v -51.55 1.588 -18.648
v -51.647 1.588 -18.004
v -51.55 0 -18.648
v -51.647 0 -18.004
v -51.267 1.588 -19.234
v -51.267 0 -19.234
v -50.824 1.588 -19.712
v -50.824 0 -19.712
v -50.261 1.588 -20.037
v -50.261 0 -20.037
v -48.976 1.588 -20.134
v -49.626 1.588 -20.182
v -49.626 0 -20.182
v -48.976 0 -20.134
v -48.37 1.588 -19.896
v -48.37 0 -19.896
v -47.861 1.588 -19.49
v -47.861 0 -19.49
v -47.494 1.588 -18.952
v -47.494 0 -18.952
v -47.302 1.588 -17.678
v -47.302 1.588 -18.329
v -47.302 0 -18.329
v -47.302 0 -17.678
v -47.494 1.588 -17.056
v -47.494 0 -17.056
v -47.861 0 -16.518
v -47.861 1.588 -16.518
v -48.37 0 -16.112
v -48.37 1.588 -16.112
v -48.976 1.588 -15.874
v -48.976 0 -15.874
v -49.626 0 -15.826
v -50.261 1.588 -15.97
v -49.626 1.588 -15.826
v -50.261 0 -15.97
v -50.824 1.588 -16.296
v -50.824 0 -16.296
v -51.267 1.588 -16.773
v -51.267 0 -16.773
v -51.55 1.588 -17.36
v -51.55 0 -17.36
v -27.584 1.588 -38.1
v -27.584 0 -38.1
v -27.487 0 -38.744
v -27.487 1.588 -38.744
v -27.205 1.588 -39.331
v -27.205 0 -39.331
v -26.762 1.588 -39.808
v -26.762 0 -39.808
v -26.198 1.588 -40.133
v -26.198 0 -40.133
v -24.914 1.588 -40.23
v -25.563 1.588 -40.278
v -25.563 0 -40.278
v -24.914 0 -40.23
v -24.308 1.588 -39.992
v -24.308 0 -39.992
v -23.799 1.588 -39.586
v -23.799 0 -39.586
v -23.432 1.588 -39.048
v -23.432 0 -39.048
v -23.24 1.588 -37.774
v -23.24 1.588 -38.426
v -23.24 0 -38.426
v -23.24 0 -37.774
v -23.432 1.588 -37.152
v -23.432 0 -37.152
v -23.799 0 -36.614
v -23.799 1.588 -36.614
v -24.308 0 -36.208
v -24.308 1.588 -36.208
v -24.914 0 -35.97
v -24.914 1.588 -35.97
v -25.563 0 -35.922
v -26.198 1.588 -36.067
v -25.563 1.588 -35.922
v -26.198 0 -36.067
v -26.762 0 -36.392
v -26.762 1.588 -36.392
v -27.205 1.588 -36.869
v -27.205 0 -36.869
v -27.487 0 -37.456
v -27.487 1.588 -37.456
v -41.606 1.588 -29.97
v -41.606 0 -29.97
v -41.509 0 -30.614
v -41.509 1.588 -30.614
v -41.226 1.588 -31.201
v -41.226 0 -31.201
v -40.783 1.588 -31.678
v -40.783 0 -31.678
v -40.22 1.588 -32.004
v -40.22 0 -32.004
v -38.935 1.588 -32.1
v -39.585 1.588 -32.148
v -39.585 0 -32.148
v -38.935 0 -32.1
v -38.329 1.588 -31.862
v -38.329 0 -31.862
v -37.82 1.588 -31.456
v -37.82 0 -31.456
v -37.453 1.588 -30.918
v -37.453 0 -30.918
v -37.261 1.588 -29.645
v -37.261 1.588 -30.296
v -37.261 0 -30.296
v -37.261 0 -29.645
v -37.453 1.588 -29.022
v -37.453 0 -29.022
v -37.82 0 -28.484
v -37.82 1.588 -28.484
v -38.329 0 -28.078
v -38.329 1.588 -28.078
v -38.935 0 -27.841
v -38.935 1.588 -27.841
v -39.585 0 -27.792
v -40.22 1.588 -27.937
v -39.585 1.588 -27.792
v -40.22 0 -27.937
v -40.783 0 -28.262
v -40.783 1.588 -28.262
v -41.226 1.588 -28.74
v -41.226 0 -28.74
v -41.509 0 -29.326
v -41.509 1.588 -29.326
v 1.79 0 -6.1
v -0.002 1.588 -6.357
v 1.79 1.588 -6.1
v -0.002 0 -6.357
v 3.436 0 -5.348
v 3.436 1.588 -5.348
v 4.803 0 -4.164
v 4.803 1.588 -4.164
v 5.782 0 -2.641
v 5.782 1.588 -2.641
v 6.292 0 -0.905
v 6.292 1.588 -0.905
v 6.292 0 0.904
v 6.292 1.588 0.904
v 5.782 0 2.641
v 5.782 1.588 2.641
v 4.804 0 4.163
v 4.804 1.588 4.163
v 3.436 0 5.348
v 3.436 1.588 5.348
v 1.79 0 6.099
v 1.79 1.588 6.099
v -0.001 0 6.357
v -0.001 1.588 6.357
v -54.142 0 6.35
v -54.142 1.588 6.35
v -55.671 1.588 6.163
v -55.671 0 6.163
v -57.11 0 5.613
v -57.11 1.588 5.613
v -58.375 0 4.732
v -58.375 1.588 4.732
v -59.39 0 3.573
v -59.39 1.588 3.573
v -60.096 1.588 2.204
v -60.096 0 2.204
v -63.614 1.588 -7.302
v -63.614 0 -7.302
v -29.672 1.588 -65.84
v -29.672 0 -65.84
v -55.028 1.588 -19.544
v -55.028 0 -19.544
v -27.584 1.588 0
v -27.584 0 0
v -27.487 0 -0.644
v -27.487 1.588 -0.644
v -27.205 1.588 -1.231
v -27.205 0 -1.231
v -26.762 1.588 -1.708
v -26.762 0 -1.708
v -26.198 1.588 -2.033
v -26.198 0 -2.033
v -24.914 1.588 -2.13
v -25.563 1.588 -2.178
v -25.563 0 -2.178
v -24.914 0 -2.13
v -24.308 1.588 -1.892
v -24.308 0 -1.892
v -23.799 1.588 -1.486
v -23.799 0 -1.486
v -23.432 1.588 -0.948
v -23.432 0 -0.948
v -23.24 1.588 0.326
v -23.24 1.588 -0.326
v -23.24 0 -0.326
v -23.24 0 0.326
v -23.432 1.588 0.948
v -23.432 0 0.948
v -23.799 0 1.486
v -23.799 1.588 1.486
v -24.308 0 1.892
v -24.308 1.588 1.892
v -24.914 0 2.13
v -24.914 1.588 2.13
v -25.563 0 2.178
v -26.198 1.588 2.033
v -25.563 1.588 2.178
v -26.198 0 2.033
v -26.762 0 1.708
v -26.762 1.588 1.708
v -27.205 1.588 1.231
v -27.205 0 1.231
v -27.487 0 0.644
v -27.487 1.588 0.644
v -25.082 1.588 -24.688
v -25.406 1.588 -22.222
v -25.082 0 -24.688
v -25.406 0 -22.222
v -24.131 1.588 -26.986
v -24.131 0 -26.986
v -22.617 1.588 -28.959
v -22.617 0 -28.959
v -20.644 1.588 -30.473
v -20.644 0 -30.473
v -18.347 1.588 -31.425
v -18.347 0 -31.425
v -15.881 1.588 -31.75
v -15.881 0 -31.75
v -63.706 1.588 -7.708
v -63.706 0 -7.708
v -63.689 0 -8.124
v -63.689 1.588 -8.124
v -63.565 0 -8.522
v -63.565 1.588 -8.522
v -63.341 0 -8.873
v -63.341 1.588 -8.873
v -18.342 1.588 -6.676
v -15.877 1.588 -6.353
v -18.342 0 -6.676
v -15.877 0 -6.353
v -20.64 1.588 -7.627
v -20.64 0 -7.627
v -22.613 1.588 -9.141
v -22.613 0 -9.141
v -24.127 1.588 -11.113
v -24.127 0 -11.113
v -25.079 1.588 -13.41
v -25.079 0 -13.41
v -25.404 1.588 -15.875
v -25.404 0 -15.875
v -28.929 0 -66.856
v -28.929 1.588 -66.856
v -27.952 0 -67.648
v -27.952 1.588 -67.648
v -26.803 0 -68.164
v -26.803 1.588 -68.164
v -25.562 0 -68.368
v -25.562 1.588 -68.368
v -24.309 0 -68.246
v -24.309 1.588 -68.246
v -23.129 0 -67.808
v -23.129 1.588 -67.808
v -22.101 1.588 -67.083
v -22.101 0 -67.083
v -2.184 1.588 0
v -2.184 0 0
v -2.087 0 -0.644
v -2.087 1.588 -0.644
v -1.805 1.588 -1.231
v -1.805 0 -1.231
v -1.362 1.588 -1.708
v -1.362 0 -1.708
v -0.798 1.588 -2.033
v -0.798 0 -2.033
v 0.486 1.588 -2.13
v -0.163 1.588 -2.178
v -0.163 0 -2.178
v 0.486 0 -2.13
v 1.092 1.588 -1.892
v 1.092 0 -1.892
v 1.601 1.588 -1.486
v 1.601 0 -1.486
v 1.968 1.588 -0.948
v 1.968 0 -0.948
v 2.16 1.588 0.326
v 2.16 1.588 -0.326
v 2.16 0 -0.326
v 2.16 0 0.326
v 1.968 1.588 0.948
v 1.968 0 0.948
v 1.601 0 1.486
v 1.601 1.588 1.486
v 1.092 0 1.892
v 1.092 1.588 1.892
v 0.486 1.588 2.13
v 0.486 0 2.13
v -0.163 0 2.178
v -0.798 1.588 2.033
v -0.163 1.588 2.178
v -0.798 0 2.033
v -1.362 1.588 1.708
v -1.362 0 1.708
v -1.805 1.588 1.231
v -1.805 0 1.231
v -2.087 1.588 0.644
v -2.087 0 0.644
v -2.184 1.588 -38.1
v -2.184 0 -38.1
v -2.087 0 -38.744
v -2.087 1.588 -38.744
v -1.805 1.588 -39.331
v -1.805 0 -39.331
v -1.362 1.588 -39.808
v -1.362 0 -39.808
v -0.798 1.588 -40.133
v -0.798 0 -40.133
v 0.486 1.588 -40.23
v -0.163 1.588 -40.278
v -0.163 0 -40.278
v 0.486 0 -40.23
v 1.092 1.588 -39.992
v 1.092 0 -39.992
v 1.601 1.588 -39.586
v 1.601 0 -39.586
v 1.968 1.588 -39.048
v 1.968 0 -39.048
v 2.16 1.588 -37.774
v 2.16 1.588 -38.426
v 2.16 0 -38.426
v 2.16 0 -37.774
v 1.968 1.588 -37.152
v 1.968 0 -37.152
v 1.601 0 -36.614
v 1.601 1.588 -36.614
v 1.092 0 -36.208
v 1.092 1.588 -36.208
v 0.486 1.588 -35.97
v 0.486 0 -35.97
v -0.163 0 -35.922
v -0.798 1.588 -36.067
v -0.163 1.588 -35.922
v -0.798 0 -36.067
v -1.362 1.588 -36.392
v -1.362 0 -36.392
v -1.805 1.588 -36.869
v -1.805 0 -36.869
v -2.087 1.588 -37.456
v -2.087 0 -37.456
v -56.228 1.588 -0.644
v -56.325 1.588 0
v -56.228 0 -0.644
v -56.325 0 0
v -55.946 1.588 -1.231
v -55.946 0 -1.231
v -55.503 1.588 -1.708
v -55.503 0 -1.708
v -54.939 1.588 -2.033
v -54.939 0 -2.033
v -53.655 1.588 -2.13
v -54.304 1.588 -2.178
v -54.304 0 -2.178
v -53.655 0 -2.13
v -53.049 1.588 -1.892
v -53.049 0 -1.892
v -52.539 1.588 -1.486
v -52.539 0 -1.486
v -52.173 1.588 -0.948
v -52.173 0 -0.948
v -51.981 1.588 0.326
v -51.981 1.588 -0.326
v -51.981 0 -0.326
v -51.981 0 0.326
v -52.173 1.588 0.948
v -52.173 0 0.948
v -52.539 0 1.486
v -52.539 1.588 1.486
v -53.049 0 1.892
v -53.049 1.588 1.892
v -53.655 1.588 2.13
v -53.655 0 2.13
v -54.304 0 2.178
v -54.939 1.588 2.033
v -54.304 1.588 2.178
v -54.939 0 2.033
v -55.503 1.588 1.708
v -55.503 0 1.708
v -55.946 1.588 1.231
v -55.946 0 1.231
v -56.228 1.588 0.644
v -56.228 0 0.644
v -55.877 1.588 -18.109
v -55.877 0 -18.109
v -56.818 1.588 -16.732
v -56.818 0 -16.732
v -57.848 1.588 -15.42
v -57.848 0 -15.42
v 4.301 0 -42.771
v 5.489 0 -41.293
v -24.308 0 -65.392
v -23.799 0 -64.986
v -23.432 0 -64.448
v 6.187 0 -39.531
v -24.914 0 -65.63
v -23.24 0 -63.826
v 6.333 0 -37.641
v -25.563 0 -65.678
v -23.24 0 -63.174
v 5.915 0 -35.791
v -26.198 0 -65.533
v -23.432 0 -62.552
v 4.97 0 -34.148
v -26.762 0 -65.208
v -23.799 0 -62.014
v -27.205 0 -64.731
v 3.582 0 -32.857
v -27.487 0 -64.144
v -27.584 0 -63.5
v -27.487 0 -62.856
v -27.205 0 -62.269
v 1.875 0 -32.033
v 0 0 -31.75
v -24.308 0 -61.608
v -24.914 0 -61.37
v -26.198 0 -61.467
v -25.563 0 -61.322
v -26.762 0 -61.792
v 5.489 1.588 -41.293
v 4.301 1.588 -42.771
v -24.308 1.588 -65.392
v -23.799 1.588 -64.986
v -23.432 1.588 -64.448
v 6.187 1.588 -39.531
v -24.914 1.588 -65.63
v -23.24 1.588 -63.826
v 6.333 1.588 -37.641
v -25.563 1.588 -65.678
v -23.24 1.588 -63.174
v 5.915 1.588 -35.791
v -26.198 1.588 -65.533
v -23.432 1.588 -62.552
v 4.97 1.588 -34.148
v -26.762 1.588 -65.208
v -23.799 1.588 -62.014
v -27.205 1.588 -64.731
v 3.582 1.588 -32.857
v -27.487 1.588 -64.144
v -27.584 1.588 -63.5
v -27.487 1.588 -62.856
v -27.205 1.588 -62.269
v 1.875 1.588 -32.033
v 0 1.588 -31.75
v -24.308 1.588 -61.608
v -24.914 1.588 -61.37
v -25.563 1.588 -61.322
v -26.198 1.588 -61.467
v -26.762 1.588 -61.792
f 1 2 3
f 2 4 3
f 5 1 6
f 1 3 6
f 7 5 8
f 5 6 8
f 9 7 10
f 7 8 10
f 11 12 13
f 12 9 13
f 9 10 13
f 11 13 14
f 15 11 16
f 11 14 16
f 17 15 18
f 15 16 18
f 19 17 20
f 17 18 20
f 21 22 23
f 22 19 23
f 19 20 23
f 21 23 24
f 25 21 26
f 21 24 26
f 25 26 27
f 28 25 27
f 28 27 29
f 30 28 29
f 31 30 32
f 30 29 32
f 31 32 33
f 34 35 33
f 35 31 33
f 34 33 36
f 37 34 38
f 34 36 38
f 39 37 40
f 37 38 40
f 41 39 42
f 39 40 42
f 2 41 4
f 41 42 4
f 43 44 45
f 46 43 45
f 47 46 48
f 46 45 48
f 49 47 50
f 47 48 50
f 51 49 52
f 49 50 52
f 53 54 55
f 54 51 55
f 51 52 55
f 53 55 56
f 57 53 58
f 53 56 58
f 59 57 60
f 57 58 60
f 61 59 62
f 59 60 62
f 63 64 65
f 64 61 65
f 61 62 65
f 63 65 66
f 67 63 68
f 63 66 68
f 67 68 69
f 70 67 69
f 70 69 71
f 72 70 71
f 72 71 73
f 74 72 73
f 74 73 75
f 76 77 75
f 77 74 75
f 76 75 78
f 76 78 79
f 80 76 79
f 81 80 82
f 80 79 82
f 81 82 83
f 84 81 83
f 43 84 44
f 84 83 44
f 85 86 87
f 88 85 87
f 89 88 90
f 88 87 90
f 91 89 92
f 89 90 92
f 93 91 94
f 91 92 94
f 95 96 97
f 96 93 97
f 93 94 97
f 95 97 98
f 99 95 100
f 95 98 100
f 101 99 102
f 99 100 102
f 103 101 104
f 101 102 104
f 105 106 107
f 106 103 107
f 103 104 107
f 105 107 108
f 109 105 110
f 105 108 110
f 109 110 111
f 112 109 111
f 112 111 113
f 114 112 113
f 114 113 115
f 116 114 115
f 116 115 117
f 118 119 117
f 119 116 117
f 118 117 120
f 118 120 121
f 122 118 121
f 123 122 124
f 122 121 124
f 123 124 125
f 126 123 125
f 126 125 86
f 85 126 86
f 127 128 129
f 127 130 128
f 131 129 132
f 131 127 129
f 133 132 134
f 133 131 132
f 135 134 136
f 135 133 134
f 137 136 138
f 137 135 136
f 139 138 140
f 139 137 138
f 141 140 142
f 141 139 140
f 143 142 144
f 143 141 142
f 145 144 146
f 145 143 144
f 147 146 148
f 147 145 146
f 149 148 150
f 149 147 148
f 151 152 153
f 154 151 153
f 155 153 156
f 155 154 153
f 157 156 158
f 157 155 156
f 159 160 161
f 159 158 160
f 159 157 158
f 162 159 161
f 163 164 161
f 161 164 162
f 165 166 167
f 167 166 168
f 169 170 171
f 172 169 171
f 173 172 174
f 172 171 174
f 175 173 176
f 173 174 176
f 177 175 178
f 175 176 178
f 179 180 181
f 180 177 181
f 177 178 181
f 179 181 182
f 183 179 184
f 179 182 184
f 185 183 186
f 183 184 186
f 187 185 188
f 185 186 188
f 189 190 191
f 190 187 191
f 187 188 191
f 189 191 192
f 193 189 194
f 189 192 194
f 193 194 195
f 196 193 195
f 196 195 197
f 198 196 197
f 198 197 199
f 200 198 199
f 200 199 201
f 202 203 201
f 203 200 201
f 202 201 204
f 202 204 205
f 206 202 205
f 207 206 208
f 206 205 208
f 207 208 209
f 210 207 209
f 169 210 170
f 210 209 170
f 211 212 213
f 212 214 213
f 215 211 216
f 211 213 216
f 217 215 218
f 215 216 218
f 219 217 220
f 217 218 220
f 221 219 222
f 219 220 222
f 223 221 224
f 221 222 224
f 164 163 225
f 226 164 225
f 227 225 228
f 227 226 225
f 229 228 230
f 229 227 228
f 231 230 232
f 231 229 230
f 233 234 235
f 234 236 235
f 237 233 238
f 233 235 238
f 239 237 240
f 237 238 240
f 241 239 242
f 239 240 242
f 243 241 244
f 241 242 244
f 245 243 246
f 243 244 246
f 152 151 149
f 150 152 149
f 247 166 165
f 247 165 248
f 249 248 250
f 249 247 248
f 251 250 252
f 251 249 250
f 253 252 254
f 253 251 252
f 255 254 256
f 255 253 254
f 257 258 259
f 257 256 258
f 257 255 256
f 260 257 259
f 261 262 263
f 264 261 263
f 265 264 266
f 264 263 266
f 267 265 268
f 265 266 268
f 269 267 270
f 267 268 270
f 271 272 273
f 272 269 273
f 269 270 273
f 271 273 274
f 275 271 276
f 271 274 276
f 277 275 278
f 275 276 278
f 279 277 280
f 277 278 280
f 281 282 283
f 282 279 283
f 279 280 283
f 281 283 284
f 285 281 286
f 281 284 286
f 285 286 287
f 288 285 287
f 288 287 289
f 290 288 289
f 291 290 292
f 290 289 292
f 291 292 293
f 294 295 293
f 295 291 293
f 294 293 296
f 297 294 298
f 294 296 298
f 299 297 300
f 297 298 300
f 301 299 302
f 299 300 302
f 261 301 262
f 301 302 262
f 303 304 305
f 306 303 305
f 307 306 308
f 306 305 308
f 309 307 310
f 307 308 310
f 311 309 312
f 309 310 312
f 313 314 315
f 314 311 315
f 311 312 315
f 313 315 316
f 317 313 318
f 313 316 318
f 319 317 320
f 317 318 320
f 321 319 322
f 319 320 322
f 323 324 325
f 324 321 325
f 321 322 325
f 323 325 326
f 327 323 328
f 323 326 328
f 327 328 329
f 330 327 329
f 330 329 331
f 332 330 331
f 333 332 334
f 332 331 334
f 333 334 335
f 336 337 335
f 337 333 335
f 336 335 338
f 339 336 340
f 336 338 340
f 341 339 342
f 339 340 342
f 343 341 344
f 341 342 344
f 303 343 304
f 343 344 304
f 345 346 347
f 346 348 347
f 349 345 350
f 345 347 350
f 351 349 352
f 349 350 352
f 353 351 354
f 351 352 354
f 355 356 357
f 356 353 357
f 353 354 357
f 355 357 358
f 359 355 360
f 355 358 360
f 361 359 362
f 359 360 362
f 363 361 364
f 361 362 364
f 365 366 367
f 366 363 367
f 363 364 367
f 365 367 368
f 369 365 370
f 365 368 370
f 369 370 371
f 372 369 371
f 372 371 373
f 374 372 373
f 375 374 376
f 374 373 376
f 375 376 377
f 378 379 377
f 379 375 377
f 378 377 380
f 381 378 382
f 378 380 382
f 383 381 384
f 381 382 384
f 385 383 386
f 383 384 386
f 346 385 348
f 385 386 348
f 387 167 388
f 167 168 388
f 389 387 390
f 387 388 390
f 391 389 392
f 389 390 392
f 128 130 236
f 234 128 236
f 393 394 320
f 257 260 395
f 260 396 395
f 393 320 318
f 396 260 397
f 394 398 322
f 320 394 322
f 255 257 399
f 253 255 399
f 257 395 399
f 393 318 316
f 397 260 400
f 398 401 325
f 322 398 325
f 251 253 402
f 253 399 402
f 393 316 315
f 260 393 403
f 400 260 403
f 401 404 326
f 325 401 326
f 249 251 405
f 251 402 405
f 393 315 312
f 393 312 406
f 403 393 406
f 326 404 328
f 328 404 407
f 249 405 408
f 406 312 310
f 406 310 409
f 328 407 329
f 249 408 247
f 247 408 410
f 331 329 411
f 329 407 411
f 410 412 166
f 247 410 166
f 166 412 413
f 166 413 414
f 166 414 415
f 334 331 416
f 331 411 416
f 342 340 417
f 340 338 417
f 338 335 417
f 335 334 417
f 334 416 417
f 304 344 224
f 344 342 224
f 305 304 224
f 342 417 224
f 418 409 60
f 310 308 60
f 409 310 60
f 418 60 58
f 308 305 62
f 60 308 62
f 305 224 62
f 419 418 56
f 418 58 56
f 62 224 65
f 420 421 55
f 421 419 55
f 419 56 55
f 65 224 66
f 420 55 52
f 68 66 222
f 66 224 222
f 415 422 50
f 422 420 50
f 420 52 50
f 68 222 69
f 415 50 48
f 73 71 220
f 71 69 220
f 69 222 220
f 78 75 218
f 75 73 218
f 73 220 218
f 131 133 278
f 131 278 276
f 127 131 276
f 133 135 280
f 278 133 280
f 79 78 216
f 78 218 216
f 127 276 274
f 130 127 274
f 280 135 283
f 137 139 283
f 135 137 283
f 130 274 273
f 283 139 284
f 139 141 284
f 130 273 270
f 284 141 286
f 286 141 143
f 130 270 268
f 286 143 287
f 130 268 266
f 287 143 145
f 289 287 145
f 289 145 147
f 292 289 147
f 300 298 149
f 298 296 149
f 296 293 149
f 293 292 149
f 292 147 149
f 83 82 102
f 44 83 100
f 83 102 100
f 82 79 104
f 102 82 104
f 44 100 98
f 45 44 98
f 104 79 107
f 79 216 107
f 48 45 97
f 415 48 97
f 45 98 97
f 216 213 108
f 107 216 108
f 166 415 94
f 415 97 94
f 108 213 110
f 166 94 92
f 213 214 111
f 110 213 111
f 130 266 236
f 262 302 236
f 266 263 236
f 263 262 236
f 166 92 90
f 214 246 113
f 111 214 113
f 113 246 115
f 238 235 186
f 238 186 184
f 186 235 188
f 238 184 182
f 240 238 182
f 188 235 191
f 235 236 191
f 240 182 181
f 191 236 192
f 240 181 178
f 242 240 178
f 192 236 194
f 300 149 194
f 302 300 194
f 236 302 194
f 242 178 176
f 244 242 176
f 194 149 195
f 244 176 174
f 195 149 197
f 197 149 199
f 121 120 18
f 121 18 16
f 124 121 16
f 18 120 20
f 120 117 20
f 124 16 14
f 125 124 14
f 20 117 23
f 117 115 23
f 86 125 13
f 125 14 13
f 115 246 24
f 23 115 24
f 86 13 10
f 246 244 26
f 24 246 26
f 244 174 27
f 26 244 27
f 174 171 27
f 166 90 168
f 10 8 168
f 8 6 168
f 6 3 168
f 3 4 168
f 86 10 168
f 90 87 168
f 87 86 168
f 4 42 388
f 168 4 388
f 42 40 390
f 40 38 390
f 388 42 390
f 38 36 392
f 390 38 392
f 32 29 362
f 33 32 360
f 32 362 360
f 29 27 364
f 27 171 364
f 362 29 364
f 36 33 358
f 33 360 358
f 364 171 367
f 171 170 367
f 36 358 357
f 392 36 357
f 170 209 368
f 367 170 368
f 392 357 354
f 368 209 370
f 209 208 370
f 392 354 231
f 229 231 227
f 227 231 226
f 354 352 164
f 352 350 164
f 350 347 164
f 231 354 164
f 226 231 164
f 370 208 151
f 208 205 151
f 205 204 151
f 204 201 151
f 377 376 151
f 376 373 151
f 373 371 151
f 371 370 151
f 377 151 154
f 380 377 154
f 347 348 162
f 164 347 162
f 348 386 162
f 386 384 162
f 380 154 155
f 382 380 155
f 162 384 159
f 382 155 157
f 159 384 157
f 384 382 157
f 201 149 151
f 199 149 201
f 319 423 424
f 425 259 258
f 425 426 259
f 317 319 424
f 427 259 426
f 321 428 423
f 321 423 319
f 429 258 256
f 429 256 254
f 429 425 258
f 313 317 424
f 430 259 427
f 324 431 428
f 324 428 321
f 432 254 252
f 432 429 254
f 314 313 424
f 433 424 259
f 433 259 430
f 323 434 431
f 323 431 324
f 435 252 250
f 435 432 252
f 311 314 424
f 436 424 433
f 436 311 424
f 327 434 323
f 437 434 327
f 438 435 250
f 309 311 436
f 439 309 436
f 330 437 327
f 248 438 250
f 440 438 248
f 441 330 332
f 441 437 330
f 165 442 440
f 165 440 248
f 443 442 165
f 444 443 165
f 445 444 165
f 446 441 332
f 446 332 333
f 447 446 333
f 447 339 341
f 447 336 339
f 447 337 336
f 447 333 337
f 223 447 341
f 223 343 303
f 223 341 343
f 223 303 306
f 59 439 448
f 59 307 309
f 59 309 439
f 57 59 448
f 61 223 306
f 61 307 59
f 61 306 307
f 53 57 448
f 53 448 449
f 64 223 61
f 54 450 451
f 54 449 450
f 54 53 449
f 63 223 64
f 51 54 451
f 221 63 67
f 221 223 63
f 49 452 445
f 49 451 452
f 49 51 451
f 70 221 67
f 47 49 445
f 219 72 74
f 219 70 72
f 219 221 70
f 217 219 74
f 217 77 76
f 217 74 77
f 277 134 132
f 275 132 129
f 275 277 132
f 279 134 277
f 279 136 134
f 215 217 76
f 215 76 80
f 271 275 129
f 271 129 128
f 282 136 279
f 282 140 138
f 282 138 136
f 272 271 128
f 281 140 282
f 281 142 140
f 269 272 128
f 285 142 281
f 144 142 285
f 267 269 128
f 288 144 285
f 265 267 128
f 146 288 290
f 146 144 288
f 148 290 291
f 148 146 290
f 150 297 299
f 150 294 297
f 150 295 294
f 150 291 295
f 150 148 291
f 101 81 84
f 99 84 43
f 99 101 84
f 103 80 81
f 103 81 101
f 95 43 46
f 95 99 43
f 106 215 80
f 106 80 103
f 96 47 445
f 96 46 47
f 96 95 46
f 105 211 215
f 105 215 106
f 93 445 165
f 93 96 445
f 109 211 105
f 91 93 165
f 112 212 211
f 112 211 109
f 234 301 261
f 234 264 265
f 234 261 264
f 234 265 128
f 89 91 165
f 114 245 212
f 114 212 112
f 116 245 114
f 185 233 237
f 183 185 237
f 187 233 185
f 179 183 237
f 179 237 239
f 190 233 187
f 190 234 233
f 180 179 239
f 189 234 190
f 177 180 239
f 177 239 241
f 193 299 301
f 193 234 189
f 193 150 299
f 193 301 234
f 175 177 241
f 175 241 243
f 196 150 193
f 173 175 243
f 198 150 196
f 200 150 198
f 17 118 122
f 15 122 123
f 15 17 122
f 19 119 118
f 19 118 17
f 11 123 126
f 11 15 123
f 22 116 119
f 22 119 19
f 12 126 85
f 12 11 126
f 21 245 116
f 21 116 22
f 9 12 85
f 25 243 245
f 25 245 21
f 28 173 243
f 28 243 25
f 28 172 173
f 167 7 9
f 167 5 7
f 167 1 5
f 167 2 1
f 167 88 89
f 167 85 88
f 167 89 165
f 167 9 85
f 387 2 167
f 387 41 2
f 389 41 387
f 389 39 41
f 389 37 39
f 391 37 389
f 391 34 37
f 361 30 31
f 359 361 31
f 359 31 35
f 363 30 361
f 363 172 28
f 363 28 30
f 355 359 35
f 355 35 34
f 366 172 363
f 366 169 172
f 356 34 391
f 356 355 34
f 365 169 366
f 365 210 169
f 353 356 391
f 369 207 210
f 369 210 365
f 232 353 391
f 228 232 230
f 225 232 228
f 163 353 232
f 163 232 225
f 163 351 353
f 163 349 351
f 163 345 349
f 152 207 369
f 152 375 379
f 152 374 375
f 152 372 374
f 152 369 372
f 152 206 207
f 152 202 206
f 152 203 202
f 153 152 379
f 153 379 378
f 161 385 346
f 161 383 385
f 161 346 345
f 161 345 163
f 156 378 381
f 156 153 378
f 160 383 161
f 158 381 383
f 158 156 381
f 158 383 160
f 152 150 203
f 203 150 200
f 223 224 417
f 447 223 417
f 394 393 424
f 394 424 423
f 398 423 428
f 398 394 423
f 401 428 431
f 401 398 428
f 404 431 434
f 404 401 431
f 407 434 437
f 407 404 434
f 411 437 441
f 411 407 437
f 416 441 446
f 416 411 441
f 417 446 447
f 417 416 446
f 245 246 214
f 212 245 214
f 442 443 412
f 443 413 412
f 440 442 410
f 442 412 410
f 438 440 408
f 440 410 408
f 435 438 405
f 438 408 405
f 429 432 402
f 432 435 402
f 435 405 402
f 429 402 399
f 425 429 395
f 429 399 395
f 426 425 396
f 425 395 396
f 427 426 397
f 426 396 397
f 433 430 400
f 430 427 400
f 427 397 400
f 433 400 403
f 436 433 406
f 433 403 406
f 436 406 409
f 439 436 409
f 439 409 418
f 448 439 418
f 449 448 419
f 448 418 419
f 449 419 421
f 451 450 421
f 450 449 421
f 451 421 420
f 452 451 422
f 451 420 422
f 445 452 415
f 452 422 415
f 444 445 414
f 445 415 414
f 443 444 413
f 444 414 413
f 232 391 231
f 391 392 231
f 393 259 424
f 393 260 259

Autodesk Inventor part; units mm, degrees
ref_plane "YZ Plane" through (0, 0, 0) normal (1, 0, 0) x (0, 1, 0)
ref_plane "XZ Plane" through (0, 0, 0) normal (0, 1, 0) x (-1, 0, 0)
ref_plane "XY Plane" through (0, 0, 0) normal (0, 0, 1) x (1, 0, 0)
sketch "main" plane through (0, 0, 0) normal (0, 0, 1) x (1, 0, 0)
  line L0 (12.0188, -14.2552) -> (37.3756, 32.0398)
  circle A0 centre (21.7688, 21.6141) radius 2.1844
  line L1 (40.1954, 36.1649) -> (45.6883, 42.7111)
  circle A1 centre (31.8098, 33.5805) radius 2.1844
  circle A2 centre (36.488, 51.5844) radius 2.1844
  arc A3 (42.4433, 53.7882) -> (36.4888, 57.9344) centre (36.488, 51.5844) ccw
  line L2 (45.961, 44.2825) -> (42.4433, 53.7882)
  arc A4 (45.6883, 42.7111) -> (45.961, 44.2825) centre (44.4722, 43.7316) ccw
  line L3 (36.4888, 57.9344) -> (-17.6519, 57.9412)
  circle A5 centre (7.7473, 51.5844) radius 2.1844
  line L4 (7.7515, 35.7094) -> (7.7532, 29.3619)
  arc A6 (7.7515, 35.7094) -> (-1.776, 45.2318) centre (-1.7735, 35.7068) ccw
  arc A7 (-1.7718, 19.8344) -> (7.7532, 29.3619) centre (-1.7718, 29.3594) ccw
  line L5 (-17.651, 45.2276) -> (-1.776, 45.2318)
  arc A8 (-17.6519, 57.9412) -> (-17.651, 45.2276) centre (-17.6527, 51.5844) ccw
  arc A9 (-17.6527, 19.8344) -> (-21.9541, 8.8131) centre (-17.6527, 13.4844) ccw
  circle A10 centre (7.7473, 13.4844) radius 2.1844
  line L6 (-1.7718, 19.8344) -> (-17.6527, 19.8344)
  arc A11 (4.4483, -15.4983) -> (12.0188, -14.2552) centre (7.7473, -11.9156) ccw
  line L7 (4.4483, -15.4983) -> (-21.9541, 8.8131)
  circle A12 centre (7.7473, -11.9156) radius 2.1844
  circle A13 centre (-17.6527, 51.5844) radius 2.1844
  circle A14 centre (-17.6527, 13.4844) radius 2.1844
  arc A15 (40.1954, 36.1649) -> (37.3756, 32.0398) centre (59.6529, 19.8381) ccw
  point P0 (10.5119, 26.5593)
  dimension "d1" = 9.7405
  dimension "d2" = 4.3688
  dimension "d3" = 4.3688
  dimension "d4" = 4.3688
  dimension "d5" = 4.3688
  dimension "d6" = 4.3688
  dimension "d7" = 25.4
sketch "Sketch1" plane through (0, 0, 0) normal (0, 1, 0) x (-1, 0, 0)
  line L0 (29.6715, -65.8396) -> (55.0283, -19.5445)
  circle A0 centre (39.4215, -29.9702) radius 2.1844
  line L1 (57.8481, -15.4195) -> (63.341, -8.8732)
  circle A1 centre (49.4625, -18.0039) radius 2.1844
  circle A2 centre (54.1407, 0) radius 2.1844
  arc A3 (60.096, 2.2039) -> (54.1415, 6.35) centre (54.1407, 0) ccw
  line L2 (63.6138, -7.3019) -> (60.096, 2.2039)
  arc A4 (63.341, -8.8732) -> (63.6138, -7.3019) centre (62.1249, -7.8528) ccw
  line L3 (54.1415, 6.35) -> (0.0008, 6.3568)
  circle A5 centre (25.4, 0) radius 2.1844
  line L4 (25.4043, -15.875) -> (25.406, -22.2224)
  arc A6 (25.4043, -15.875) -> (15.8767, -6.3526) centre (15.8793, -15.8776) ccw
  arc A7 (15.881, -31.75) -> (25.406, -22.2224) centre (15.881, -22.225) ccw
  line L5 (0.0017, -6.3568) -> (15.8767, -6.3526)
  arc A8 (0.0008, 6.3568) -> (0.0017, -6.3568) centre (0, 0) ccw
  arc A9 (0, -31.75) -> (-4.3013, -42.7713) centre (0, -38.1) ccw
  circle A10 centre (25.4, -38.1) radius 2.1844
  line L6 (15.881, -31.75) -> (0, -31.75)
  arc A11 (22.101, -67.0827) -> (29.6715, -65.8396) centre (25.4, -63.5) ccw
  line L7 (22.101, -67.0827) -> (-4.3013, -42.7713)
  circle A12 centre (25.4, -63.5) radius 2.1844
  circle A13 centre (0, 0) radius 2.1844
  circle A14 centre (0, -38.1) radius 2.1844
  arc A15 (57.8481, -15.4195) -> (55.0283, -19.5445) centre (77.3056, -31.7463) ccw
extrude "Extrusion1" add sketch "Sketch1" along normal blind 1.5875
properties part number "Funnel Gusset Back Improved" material "Acetal Resin, White"
